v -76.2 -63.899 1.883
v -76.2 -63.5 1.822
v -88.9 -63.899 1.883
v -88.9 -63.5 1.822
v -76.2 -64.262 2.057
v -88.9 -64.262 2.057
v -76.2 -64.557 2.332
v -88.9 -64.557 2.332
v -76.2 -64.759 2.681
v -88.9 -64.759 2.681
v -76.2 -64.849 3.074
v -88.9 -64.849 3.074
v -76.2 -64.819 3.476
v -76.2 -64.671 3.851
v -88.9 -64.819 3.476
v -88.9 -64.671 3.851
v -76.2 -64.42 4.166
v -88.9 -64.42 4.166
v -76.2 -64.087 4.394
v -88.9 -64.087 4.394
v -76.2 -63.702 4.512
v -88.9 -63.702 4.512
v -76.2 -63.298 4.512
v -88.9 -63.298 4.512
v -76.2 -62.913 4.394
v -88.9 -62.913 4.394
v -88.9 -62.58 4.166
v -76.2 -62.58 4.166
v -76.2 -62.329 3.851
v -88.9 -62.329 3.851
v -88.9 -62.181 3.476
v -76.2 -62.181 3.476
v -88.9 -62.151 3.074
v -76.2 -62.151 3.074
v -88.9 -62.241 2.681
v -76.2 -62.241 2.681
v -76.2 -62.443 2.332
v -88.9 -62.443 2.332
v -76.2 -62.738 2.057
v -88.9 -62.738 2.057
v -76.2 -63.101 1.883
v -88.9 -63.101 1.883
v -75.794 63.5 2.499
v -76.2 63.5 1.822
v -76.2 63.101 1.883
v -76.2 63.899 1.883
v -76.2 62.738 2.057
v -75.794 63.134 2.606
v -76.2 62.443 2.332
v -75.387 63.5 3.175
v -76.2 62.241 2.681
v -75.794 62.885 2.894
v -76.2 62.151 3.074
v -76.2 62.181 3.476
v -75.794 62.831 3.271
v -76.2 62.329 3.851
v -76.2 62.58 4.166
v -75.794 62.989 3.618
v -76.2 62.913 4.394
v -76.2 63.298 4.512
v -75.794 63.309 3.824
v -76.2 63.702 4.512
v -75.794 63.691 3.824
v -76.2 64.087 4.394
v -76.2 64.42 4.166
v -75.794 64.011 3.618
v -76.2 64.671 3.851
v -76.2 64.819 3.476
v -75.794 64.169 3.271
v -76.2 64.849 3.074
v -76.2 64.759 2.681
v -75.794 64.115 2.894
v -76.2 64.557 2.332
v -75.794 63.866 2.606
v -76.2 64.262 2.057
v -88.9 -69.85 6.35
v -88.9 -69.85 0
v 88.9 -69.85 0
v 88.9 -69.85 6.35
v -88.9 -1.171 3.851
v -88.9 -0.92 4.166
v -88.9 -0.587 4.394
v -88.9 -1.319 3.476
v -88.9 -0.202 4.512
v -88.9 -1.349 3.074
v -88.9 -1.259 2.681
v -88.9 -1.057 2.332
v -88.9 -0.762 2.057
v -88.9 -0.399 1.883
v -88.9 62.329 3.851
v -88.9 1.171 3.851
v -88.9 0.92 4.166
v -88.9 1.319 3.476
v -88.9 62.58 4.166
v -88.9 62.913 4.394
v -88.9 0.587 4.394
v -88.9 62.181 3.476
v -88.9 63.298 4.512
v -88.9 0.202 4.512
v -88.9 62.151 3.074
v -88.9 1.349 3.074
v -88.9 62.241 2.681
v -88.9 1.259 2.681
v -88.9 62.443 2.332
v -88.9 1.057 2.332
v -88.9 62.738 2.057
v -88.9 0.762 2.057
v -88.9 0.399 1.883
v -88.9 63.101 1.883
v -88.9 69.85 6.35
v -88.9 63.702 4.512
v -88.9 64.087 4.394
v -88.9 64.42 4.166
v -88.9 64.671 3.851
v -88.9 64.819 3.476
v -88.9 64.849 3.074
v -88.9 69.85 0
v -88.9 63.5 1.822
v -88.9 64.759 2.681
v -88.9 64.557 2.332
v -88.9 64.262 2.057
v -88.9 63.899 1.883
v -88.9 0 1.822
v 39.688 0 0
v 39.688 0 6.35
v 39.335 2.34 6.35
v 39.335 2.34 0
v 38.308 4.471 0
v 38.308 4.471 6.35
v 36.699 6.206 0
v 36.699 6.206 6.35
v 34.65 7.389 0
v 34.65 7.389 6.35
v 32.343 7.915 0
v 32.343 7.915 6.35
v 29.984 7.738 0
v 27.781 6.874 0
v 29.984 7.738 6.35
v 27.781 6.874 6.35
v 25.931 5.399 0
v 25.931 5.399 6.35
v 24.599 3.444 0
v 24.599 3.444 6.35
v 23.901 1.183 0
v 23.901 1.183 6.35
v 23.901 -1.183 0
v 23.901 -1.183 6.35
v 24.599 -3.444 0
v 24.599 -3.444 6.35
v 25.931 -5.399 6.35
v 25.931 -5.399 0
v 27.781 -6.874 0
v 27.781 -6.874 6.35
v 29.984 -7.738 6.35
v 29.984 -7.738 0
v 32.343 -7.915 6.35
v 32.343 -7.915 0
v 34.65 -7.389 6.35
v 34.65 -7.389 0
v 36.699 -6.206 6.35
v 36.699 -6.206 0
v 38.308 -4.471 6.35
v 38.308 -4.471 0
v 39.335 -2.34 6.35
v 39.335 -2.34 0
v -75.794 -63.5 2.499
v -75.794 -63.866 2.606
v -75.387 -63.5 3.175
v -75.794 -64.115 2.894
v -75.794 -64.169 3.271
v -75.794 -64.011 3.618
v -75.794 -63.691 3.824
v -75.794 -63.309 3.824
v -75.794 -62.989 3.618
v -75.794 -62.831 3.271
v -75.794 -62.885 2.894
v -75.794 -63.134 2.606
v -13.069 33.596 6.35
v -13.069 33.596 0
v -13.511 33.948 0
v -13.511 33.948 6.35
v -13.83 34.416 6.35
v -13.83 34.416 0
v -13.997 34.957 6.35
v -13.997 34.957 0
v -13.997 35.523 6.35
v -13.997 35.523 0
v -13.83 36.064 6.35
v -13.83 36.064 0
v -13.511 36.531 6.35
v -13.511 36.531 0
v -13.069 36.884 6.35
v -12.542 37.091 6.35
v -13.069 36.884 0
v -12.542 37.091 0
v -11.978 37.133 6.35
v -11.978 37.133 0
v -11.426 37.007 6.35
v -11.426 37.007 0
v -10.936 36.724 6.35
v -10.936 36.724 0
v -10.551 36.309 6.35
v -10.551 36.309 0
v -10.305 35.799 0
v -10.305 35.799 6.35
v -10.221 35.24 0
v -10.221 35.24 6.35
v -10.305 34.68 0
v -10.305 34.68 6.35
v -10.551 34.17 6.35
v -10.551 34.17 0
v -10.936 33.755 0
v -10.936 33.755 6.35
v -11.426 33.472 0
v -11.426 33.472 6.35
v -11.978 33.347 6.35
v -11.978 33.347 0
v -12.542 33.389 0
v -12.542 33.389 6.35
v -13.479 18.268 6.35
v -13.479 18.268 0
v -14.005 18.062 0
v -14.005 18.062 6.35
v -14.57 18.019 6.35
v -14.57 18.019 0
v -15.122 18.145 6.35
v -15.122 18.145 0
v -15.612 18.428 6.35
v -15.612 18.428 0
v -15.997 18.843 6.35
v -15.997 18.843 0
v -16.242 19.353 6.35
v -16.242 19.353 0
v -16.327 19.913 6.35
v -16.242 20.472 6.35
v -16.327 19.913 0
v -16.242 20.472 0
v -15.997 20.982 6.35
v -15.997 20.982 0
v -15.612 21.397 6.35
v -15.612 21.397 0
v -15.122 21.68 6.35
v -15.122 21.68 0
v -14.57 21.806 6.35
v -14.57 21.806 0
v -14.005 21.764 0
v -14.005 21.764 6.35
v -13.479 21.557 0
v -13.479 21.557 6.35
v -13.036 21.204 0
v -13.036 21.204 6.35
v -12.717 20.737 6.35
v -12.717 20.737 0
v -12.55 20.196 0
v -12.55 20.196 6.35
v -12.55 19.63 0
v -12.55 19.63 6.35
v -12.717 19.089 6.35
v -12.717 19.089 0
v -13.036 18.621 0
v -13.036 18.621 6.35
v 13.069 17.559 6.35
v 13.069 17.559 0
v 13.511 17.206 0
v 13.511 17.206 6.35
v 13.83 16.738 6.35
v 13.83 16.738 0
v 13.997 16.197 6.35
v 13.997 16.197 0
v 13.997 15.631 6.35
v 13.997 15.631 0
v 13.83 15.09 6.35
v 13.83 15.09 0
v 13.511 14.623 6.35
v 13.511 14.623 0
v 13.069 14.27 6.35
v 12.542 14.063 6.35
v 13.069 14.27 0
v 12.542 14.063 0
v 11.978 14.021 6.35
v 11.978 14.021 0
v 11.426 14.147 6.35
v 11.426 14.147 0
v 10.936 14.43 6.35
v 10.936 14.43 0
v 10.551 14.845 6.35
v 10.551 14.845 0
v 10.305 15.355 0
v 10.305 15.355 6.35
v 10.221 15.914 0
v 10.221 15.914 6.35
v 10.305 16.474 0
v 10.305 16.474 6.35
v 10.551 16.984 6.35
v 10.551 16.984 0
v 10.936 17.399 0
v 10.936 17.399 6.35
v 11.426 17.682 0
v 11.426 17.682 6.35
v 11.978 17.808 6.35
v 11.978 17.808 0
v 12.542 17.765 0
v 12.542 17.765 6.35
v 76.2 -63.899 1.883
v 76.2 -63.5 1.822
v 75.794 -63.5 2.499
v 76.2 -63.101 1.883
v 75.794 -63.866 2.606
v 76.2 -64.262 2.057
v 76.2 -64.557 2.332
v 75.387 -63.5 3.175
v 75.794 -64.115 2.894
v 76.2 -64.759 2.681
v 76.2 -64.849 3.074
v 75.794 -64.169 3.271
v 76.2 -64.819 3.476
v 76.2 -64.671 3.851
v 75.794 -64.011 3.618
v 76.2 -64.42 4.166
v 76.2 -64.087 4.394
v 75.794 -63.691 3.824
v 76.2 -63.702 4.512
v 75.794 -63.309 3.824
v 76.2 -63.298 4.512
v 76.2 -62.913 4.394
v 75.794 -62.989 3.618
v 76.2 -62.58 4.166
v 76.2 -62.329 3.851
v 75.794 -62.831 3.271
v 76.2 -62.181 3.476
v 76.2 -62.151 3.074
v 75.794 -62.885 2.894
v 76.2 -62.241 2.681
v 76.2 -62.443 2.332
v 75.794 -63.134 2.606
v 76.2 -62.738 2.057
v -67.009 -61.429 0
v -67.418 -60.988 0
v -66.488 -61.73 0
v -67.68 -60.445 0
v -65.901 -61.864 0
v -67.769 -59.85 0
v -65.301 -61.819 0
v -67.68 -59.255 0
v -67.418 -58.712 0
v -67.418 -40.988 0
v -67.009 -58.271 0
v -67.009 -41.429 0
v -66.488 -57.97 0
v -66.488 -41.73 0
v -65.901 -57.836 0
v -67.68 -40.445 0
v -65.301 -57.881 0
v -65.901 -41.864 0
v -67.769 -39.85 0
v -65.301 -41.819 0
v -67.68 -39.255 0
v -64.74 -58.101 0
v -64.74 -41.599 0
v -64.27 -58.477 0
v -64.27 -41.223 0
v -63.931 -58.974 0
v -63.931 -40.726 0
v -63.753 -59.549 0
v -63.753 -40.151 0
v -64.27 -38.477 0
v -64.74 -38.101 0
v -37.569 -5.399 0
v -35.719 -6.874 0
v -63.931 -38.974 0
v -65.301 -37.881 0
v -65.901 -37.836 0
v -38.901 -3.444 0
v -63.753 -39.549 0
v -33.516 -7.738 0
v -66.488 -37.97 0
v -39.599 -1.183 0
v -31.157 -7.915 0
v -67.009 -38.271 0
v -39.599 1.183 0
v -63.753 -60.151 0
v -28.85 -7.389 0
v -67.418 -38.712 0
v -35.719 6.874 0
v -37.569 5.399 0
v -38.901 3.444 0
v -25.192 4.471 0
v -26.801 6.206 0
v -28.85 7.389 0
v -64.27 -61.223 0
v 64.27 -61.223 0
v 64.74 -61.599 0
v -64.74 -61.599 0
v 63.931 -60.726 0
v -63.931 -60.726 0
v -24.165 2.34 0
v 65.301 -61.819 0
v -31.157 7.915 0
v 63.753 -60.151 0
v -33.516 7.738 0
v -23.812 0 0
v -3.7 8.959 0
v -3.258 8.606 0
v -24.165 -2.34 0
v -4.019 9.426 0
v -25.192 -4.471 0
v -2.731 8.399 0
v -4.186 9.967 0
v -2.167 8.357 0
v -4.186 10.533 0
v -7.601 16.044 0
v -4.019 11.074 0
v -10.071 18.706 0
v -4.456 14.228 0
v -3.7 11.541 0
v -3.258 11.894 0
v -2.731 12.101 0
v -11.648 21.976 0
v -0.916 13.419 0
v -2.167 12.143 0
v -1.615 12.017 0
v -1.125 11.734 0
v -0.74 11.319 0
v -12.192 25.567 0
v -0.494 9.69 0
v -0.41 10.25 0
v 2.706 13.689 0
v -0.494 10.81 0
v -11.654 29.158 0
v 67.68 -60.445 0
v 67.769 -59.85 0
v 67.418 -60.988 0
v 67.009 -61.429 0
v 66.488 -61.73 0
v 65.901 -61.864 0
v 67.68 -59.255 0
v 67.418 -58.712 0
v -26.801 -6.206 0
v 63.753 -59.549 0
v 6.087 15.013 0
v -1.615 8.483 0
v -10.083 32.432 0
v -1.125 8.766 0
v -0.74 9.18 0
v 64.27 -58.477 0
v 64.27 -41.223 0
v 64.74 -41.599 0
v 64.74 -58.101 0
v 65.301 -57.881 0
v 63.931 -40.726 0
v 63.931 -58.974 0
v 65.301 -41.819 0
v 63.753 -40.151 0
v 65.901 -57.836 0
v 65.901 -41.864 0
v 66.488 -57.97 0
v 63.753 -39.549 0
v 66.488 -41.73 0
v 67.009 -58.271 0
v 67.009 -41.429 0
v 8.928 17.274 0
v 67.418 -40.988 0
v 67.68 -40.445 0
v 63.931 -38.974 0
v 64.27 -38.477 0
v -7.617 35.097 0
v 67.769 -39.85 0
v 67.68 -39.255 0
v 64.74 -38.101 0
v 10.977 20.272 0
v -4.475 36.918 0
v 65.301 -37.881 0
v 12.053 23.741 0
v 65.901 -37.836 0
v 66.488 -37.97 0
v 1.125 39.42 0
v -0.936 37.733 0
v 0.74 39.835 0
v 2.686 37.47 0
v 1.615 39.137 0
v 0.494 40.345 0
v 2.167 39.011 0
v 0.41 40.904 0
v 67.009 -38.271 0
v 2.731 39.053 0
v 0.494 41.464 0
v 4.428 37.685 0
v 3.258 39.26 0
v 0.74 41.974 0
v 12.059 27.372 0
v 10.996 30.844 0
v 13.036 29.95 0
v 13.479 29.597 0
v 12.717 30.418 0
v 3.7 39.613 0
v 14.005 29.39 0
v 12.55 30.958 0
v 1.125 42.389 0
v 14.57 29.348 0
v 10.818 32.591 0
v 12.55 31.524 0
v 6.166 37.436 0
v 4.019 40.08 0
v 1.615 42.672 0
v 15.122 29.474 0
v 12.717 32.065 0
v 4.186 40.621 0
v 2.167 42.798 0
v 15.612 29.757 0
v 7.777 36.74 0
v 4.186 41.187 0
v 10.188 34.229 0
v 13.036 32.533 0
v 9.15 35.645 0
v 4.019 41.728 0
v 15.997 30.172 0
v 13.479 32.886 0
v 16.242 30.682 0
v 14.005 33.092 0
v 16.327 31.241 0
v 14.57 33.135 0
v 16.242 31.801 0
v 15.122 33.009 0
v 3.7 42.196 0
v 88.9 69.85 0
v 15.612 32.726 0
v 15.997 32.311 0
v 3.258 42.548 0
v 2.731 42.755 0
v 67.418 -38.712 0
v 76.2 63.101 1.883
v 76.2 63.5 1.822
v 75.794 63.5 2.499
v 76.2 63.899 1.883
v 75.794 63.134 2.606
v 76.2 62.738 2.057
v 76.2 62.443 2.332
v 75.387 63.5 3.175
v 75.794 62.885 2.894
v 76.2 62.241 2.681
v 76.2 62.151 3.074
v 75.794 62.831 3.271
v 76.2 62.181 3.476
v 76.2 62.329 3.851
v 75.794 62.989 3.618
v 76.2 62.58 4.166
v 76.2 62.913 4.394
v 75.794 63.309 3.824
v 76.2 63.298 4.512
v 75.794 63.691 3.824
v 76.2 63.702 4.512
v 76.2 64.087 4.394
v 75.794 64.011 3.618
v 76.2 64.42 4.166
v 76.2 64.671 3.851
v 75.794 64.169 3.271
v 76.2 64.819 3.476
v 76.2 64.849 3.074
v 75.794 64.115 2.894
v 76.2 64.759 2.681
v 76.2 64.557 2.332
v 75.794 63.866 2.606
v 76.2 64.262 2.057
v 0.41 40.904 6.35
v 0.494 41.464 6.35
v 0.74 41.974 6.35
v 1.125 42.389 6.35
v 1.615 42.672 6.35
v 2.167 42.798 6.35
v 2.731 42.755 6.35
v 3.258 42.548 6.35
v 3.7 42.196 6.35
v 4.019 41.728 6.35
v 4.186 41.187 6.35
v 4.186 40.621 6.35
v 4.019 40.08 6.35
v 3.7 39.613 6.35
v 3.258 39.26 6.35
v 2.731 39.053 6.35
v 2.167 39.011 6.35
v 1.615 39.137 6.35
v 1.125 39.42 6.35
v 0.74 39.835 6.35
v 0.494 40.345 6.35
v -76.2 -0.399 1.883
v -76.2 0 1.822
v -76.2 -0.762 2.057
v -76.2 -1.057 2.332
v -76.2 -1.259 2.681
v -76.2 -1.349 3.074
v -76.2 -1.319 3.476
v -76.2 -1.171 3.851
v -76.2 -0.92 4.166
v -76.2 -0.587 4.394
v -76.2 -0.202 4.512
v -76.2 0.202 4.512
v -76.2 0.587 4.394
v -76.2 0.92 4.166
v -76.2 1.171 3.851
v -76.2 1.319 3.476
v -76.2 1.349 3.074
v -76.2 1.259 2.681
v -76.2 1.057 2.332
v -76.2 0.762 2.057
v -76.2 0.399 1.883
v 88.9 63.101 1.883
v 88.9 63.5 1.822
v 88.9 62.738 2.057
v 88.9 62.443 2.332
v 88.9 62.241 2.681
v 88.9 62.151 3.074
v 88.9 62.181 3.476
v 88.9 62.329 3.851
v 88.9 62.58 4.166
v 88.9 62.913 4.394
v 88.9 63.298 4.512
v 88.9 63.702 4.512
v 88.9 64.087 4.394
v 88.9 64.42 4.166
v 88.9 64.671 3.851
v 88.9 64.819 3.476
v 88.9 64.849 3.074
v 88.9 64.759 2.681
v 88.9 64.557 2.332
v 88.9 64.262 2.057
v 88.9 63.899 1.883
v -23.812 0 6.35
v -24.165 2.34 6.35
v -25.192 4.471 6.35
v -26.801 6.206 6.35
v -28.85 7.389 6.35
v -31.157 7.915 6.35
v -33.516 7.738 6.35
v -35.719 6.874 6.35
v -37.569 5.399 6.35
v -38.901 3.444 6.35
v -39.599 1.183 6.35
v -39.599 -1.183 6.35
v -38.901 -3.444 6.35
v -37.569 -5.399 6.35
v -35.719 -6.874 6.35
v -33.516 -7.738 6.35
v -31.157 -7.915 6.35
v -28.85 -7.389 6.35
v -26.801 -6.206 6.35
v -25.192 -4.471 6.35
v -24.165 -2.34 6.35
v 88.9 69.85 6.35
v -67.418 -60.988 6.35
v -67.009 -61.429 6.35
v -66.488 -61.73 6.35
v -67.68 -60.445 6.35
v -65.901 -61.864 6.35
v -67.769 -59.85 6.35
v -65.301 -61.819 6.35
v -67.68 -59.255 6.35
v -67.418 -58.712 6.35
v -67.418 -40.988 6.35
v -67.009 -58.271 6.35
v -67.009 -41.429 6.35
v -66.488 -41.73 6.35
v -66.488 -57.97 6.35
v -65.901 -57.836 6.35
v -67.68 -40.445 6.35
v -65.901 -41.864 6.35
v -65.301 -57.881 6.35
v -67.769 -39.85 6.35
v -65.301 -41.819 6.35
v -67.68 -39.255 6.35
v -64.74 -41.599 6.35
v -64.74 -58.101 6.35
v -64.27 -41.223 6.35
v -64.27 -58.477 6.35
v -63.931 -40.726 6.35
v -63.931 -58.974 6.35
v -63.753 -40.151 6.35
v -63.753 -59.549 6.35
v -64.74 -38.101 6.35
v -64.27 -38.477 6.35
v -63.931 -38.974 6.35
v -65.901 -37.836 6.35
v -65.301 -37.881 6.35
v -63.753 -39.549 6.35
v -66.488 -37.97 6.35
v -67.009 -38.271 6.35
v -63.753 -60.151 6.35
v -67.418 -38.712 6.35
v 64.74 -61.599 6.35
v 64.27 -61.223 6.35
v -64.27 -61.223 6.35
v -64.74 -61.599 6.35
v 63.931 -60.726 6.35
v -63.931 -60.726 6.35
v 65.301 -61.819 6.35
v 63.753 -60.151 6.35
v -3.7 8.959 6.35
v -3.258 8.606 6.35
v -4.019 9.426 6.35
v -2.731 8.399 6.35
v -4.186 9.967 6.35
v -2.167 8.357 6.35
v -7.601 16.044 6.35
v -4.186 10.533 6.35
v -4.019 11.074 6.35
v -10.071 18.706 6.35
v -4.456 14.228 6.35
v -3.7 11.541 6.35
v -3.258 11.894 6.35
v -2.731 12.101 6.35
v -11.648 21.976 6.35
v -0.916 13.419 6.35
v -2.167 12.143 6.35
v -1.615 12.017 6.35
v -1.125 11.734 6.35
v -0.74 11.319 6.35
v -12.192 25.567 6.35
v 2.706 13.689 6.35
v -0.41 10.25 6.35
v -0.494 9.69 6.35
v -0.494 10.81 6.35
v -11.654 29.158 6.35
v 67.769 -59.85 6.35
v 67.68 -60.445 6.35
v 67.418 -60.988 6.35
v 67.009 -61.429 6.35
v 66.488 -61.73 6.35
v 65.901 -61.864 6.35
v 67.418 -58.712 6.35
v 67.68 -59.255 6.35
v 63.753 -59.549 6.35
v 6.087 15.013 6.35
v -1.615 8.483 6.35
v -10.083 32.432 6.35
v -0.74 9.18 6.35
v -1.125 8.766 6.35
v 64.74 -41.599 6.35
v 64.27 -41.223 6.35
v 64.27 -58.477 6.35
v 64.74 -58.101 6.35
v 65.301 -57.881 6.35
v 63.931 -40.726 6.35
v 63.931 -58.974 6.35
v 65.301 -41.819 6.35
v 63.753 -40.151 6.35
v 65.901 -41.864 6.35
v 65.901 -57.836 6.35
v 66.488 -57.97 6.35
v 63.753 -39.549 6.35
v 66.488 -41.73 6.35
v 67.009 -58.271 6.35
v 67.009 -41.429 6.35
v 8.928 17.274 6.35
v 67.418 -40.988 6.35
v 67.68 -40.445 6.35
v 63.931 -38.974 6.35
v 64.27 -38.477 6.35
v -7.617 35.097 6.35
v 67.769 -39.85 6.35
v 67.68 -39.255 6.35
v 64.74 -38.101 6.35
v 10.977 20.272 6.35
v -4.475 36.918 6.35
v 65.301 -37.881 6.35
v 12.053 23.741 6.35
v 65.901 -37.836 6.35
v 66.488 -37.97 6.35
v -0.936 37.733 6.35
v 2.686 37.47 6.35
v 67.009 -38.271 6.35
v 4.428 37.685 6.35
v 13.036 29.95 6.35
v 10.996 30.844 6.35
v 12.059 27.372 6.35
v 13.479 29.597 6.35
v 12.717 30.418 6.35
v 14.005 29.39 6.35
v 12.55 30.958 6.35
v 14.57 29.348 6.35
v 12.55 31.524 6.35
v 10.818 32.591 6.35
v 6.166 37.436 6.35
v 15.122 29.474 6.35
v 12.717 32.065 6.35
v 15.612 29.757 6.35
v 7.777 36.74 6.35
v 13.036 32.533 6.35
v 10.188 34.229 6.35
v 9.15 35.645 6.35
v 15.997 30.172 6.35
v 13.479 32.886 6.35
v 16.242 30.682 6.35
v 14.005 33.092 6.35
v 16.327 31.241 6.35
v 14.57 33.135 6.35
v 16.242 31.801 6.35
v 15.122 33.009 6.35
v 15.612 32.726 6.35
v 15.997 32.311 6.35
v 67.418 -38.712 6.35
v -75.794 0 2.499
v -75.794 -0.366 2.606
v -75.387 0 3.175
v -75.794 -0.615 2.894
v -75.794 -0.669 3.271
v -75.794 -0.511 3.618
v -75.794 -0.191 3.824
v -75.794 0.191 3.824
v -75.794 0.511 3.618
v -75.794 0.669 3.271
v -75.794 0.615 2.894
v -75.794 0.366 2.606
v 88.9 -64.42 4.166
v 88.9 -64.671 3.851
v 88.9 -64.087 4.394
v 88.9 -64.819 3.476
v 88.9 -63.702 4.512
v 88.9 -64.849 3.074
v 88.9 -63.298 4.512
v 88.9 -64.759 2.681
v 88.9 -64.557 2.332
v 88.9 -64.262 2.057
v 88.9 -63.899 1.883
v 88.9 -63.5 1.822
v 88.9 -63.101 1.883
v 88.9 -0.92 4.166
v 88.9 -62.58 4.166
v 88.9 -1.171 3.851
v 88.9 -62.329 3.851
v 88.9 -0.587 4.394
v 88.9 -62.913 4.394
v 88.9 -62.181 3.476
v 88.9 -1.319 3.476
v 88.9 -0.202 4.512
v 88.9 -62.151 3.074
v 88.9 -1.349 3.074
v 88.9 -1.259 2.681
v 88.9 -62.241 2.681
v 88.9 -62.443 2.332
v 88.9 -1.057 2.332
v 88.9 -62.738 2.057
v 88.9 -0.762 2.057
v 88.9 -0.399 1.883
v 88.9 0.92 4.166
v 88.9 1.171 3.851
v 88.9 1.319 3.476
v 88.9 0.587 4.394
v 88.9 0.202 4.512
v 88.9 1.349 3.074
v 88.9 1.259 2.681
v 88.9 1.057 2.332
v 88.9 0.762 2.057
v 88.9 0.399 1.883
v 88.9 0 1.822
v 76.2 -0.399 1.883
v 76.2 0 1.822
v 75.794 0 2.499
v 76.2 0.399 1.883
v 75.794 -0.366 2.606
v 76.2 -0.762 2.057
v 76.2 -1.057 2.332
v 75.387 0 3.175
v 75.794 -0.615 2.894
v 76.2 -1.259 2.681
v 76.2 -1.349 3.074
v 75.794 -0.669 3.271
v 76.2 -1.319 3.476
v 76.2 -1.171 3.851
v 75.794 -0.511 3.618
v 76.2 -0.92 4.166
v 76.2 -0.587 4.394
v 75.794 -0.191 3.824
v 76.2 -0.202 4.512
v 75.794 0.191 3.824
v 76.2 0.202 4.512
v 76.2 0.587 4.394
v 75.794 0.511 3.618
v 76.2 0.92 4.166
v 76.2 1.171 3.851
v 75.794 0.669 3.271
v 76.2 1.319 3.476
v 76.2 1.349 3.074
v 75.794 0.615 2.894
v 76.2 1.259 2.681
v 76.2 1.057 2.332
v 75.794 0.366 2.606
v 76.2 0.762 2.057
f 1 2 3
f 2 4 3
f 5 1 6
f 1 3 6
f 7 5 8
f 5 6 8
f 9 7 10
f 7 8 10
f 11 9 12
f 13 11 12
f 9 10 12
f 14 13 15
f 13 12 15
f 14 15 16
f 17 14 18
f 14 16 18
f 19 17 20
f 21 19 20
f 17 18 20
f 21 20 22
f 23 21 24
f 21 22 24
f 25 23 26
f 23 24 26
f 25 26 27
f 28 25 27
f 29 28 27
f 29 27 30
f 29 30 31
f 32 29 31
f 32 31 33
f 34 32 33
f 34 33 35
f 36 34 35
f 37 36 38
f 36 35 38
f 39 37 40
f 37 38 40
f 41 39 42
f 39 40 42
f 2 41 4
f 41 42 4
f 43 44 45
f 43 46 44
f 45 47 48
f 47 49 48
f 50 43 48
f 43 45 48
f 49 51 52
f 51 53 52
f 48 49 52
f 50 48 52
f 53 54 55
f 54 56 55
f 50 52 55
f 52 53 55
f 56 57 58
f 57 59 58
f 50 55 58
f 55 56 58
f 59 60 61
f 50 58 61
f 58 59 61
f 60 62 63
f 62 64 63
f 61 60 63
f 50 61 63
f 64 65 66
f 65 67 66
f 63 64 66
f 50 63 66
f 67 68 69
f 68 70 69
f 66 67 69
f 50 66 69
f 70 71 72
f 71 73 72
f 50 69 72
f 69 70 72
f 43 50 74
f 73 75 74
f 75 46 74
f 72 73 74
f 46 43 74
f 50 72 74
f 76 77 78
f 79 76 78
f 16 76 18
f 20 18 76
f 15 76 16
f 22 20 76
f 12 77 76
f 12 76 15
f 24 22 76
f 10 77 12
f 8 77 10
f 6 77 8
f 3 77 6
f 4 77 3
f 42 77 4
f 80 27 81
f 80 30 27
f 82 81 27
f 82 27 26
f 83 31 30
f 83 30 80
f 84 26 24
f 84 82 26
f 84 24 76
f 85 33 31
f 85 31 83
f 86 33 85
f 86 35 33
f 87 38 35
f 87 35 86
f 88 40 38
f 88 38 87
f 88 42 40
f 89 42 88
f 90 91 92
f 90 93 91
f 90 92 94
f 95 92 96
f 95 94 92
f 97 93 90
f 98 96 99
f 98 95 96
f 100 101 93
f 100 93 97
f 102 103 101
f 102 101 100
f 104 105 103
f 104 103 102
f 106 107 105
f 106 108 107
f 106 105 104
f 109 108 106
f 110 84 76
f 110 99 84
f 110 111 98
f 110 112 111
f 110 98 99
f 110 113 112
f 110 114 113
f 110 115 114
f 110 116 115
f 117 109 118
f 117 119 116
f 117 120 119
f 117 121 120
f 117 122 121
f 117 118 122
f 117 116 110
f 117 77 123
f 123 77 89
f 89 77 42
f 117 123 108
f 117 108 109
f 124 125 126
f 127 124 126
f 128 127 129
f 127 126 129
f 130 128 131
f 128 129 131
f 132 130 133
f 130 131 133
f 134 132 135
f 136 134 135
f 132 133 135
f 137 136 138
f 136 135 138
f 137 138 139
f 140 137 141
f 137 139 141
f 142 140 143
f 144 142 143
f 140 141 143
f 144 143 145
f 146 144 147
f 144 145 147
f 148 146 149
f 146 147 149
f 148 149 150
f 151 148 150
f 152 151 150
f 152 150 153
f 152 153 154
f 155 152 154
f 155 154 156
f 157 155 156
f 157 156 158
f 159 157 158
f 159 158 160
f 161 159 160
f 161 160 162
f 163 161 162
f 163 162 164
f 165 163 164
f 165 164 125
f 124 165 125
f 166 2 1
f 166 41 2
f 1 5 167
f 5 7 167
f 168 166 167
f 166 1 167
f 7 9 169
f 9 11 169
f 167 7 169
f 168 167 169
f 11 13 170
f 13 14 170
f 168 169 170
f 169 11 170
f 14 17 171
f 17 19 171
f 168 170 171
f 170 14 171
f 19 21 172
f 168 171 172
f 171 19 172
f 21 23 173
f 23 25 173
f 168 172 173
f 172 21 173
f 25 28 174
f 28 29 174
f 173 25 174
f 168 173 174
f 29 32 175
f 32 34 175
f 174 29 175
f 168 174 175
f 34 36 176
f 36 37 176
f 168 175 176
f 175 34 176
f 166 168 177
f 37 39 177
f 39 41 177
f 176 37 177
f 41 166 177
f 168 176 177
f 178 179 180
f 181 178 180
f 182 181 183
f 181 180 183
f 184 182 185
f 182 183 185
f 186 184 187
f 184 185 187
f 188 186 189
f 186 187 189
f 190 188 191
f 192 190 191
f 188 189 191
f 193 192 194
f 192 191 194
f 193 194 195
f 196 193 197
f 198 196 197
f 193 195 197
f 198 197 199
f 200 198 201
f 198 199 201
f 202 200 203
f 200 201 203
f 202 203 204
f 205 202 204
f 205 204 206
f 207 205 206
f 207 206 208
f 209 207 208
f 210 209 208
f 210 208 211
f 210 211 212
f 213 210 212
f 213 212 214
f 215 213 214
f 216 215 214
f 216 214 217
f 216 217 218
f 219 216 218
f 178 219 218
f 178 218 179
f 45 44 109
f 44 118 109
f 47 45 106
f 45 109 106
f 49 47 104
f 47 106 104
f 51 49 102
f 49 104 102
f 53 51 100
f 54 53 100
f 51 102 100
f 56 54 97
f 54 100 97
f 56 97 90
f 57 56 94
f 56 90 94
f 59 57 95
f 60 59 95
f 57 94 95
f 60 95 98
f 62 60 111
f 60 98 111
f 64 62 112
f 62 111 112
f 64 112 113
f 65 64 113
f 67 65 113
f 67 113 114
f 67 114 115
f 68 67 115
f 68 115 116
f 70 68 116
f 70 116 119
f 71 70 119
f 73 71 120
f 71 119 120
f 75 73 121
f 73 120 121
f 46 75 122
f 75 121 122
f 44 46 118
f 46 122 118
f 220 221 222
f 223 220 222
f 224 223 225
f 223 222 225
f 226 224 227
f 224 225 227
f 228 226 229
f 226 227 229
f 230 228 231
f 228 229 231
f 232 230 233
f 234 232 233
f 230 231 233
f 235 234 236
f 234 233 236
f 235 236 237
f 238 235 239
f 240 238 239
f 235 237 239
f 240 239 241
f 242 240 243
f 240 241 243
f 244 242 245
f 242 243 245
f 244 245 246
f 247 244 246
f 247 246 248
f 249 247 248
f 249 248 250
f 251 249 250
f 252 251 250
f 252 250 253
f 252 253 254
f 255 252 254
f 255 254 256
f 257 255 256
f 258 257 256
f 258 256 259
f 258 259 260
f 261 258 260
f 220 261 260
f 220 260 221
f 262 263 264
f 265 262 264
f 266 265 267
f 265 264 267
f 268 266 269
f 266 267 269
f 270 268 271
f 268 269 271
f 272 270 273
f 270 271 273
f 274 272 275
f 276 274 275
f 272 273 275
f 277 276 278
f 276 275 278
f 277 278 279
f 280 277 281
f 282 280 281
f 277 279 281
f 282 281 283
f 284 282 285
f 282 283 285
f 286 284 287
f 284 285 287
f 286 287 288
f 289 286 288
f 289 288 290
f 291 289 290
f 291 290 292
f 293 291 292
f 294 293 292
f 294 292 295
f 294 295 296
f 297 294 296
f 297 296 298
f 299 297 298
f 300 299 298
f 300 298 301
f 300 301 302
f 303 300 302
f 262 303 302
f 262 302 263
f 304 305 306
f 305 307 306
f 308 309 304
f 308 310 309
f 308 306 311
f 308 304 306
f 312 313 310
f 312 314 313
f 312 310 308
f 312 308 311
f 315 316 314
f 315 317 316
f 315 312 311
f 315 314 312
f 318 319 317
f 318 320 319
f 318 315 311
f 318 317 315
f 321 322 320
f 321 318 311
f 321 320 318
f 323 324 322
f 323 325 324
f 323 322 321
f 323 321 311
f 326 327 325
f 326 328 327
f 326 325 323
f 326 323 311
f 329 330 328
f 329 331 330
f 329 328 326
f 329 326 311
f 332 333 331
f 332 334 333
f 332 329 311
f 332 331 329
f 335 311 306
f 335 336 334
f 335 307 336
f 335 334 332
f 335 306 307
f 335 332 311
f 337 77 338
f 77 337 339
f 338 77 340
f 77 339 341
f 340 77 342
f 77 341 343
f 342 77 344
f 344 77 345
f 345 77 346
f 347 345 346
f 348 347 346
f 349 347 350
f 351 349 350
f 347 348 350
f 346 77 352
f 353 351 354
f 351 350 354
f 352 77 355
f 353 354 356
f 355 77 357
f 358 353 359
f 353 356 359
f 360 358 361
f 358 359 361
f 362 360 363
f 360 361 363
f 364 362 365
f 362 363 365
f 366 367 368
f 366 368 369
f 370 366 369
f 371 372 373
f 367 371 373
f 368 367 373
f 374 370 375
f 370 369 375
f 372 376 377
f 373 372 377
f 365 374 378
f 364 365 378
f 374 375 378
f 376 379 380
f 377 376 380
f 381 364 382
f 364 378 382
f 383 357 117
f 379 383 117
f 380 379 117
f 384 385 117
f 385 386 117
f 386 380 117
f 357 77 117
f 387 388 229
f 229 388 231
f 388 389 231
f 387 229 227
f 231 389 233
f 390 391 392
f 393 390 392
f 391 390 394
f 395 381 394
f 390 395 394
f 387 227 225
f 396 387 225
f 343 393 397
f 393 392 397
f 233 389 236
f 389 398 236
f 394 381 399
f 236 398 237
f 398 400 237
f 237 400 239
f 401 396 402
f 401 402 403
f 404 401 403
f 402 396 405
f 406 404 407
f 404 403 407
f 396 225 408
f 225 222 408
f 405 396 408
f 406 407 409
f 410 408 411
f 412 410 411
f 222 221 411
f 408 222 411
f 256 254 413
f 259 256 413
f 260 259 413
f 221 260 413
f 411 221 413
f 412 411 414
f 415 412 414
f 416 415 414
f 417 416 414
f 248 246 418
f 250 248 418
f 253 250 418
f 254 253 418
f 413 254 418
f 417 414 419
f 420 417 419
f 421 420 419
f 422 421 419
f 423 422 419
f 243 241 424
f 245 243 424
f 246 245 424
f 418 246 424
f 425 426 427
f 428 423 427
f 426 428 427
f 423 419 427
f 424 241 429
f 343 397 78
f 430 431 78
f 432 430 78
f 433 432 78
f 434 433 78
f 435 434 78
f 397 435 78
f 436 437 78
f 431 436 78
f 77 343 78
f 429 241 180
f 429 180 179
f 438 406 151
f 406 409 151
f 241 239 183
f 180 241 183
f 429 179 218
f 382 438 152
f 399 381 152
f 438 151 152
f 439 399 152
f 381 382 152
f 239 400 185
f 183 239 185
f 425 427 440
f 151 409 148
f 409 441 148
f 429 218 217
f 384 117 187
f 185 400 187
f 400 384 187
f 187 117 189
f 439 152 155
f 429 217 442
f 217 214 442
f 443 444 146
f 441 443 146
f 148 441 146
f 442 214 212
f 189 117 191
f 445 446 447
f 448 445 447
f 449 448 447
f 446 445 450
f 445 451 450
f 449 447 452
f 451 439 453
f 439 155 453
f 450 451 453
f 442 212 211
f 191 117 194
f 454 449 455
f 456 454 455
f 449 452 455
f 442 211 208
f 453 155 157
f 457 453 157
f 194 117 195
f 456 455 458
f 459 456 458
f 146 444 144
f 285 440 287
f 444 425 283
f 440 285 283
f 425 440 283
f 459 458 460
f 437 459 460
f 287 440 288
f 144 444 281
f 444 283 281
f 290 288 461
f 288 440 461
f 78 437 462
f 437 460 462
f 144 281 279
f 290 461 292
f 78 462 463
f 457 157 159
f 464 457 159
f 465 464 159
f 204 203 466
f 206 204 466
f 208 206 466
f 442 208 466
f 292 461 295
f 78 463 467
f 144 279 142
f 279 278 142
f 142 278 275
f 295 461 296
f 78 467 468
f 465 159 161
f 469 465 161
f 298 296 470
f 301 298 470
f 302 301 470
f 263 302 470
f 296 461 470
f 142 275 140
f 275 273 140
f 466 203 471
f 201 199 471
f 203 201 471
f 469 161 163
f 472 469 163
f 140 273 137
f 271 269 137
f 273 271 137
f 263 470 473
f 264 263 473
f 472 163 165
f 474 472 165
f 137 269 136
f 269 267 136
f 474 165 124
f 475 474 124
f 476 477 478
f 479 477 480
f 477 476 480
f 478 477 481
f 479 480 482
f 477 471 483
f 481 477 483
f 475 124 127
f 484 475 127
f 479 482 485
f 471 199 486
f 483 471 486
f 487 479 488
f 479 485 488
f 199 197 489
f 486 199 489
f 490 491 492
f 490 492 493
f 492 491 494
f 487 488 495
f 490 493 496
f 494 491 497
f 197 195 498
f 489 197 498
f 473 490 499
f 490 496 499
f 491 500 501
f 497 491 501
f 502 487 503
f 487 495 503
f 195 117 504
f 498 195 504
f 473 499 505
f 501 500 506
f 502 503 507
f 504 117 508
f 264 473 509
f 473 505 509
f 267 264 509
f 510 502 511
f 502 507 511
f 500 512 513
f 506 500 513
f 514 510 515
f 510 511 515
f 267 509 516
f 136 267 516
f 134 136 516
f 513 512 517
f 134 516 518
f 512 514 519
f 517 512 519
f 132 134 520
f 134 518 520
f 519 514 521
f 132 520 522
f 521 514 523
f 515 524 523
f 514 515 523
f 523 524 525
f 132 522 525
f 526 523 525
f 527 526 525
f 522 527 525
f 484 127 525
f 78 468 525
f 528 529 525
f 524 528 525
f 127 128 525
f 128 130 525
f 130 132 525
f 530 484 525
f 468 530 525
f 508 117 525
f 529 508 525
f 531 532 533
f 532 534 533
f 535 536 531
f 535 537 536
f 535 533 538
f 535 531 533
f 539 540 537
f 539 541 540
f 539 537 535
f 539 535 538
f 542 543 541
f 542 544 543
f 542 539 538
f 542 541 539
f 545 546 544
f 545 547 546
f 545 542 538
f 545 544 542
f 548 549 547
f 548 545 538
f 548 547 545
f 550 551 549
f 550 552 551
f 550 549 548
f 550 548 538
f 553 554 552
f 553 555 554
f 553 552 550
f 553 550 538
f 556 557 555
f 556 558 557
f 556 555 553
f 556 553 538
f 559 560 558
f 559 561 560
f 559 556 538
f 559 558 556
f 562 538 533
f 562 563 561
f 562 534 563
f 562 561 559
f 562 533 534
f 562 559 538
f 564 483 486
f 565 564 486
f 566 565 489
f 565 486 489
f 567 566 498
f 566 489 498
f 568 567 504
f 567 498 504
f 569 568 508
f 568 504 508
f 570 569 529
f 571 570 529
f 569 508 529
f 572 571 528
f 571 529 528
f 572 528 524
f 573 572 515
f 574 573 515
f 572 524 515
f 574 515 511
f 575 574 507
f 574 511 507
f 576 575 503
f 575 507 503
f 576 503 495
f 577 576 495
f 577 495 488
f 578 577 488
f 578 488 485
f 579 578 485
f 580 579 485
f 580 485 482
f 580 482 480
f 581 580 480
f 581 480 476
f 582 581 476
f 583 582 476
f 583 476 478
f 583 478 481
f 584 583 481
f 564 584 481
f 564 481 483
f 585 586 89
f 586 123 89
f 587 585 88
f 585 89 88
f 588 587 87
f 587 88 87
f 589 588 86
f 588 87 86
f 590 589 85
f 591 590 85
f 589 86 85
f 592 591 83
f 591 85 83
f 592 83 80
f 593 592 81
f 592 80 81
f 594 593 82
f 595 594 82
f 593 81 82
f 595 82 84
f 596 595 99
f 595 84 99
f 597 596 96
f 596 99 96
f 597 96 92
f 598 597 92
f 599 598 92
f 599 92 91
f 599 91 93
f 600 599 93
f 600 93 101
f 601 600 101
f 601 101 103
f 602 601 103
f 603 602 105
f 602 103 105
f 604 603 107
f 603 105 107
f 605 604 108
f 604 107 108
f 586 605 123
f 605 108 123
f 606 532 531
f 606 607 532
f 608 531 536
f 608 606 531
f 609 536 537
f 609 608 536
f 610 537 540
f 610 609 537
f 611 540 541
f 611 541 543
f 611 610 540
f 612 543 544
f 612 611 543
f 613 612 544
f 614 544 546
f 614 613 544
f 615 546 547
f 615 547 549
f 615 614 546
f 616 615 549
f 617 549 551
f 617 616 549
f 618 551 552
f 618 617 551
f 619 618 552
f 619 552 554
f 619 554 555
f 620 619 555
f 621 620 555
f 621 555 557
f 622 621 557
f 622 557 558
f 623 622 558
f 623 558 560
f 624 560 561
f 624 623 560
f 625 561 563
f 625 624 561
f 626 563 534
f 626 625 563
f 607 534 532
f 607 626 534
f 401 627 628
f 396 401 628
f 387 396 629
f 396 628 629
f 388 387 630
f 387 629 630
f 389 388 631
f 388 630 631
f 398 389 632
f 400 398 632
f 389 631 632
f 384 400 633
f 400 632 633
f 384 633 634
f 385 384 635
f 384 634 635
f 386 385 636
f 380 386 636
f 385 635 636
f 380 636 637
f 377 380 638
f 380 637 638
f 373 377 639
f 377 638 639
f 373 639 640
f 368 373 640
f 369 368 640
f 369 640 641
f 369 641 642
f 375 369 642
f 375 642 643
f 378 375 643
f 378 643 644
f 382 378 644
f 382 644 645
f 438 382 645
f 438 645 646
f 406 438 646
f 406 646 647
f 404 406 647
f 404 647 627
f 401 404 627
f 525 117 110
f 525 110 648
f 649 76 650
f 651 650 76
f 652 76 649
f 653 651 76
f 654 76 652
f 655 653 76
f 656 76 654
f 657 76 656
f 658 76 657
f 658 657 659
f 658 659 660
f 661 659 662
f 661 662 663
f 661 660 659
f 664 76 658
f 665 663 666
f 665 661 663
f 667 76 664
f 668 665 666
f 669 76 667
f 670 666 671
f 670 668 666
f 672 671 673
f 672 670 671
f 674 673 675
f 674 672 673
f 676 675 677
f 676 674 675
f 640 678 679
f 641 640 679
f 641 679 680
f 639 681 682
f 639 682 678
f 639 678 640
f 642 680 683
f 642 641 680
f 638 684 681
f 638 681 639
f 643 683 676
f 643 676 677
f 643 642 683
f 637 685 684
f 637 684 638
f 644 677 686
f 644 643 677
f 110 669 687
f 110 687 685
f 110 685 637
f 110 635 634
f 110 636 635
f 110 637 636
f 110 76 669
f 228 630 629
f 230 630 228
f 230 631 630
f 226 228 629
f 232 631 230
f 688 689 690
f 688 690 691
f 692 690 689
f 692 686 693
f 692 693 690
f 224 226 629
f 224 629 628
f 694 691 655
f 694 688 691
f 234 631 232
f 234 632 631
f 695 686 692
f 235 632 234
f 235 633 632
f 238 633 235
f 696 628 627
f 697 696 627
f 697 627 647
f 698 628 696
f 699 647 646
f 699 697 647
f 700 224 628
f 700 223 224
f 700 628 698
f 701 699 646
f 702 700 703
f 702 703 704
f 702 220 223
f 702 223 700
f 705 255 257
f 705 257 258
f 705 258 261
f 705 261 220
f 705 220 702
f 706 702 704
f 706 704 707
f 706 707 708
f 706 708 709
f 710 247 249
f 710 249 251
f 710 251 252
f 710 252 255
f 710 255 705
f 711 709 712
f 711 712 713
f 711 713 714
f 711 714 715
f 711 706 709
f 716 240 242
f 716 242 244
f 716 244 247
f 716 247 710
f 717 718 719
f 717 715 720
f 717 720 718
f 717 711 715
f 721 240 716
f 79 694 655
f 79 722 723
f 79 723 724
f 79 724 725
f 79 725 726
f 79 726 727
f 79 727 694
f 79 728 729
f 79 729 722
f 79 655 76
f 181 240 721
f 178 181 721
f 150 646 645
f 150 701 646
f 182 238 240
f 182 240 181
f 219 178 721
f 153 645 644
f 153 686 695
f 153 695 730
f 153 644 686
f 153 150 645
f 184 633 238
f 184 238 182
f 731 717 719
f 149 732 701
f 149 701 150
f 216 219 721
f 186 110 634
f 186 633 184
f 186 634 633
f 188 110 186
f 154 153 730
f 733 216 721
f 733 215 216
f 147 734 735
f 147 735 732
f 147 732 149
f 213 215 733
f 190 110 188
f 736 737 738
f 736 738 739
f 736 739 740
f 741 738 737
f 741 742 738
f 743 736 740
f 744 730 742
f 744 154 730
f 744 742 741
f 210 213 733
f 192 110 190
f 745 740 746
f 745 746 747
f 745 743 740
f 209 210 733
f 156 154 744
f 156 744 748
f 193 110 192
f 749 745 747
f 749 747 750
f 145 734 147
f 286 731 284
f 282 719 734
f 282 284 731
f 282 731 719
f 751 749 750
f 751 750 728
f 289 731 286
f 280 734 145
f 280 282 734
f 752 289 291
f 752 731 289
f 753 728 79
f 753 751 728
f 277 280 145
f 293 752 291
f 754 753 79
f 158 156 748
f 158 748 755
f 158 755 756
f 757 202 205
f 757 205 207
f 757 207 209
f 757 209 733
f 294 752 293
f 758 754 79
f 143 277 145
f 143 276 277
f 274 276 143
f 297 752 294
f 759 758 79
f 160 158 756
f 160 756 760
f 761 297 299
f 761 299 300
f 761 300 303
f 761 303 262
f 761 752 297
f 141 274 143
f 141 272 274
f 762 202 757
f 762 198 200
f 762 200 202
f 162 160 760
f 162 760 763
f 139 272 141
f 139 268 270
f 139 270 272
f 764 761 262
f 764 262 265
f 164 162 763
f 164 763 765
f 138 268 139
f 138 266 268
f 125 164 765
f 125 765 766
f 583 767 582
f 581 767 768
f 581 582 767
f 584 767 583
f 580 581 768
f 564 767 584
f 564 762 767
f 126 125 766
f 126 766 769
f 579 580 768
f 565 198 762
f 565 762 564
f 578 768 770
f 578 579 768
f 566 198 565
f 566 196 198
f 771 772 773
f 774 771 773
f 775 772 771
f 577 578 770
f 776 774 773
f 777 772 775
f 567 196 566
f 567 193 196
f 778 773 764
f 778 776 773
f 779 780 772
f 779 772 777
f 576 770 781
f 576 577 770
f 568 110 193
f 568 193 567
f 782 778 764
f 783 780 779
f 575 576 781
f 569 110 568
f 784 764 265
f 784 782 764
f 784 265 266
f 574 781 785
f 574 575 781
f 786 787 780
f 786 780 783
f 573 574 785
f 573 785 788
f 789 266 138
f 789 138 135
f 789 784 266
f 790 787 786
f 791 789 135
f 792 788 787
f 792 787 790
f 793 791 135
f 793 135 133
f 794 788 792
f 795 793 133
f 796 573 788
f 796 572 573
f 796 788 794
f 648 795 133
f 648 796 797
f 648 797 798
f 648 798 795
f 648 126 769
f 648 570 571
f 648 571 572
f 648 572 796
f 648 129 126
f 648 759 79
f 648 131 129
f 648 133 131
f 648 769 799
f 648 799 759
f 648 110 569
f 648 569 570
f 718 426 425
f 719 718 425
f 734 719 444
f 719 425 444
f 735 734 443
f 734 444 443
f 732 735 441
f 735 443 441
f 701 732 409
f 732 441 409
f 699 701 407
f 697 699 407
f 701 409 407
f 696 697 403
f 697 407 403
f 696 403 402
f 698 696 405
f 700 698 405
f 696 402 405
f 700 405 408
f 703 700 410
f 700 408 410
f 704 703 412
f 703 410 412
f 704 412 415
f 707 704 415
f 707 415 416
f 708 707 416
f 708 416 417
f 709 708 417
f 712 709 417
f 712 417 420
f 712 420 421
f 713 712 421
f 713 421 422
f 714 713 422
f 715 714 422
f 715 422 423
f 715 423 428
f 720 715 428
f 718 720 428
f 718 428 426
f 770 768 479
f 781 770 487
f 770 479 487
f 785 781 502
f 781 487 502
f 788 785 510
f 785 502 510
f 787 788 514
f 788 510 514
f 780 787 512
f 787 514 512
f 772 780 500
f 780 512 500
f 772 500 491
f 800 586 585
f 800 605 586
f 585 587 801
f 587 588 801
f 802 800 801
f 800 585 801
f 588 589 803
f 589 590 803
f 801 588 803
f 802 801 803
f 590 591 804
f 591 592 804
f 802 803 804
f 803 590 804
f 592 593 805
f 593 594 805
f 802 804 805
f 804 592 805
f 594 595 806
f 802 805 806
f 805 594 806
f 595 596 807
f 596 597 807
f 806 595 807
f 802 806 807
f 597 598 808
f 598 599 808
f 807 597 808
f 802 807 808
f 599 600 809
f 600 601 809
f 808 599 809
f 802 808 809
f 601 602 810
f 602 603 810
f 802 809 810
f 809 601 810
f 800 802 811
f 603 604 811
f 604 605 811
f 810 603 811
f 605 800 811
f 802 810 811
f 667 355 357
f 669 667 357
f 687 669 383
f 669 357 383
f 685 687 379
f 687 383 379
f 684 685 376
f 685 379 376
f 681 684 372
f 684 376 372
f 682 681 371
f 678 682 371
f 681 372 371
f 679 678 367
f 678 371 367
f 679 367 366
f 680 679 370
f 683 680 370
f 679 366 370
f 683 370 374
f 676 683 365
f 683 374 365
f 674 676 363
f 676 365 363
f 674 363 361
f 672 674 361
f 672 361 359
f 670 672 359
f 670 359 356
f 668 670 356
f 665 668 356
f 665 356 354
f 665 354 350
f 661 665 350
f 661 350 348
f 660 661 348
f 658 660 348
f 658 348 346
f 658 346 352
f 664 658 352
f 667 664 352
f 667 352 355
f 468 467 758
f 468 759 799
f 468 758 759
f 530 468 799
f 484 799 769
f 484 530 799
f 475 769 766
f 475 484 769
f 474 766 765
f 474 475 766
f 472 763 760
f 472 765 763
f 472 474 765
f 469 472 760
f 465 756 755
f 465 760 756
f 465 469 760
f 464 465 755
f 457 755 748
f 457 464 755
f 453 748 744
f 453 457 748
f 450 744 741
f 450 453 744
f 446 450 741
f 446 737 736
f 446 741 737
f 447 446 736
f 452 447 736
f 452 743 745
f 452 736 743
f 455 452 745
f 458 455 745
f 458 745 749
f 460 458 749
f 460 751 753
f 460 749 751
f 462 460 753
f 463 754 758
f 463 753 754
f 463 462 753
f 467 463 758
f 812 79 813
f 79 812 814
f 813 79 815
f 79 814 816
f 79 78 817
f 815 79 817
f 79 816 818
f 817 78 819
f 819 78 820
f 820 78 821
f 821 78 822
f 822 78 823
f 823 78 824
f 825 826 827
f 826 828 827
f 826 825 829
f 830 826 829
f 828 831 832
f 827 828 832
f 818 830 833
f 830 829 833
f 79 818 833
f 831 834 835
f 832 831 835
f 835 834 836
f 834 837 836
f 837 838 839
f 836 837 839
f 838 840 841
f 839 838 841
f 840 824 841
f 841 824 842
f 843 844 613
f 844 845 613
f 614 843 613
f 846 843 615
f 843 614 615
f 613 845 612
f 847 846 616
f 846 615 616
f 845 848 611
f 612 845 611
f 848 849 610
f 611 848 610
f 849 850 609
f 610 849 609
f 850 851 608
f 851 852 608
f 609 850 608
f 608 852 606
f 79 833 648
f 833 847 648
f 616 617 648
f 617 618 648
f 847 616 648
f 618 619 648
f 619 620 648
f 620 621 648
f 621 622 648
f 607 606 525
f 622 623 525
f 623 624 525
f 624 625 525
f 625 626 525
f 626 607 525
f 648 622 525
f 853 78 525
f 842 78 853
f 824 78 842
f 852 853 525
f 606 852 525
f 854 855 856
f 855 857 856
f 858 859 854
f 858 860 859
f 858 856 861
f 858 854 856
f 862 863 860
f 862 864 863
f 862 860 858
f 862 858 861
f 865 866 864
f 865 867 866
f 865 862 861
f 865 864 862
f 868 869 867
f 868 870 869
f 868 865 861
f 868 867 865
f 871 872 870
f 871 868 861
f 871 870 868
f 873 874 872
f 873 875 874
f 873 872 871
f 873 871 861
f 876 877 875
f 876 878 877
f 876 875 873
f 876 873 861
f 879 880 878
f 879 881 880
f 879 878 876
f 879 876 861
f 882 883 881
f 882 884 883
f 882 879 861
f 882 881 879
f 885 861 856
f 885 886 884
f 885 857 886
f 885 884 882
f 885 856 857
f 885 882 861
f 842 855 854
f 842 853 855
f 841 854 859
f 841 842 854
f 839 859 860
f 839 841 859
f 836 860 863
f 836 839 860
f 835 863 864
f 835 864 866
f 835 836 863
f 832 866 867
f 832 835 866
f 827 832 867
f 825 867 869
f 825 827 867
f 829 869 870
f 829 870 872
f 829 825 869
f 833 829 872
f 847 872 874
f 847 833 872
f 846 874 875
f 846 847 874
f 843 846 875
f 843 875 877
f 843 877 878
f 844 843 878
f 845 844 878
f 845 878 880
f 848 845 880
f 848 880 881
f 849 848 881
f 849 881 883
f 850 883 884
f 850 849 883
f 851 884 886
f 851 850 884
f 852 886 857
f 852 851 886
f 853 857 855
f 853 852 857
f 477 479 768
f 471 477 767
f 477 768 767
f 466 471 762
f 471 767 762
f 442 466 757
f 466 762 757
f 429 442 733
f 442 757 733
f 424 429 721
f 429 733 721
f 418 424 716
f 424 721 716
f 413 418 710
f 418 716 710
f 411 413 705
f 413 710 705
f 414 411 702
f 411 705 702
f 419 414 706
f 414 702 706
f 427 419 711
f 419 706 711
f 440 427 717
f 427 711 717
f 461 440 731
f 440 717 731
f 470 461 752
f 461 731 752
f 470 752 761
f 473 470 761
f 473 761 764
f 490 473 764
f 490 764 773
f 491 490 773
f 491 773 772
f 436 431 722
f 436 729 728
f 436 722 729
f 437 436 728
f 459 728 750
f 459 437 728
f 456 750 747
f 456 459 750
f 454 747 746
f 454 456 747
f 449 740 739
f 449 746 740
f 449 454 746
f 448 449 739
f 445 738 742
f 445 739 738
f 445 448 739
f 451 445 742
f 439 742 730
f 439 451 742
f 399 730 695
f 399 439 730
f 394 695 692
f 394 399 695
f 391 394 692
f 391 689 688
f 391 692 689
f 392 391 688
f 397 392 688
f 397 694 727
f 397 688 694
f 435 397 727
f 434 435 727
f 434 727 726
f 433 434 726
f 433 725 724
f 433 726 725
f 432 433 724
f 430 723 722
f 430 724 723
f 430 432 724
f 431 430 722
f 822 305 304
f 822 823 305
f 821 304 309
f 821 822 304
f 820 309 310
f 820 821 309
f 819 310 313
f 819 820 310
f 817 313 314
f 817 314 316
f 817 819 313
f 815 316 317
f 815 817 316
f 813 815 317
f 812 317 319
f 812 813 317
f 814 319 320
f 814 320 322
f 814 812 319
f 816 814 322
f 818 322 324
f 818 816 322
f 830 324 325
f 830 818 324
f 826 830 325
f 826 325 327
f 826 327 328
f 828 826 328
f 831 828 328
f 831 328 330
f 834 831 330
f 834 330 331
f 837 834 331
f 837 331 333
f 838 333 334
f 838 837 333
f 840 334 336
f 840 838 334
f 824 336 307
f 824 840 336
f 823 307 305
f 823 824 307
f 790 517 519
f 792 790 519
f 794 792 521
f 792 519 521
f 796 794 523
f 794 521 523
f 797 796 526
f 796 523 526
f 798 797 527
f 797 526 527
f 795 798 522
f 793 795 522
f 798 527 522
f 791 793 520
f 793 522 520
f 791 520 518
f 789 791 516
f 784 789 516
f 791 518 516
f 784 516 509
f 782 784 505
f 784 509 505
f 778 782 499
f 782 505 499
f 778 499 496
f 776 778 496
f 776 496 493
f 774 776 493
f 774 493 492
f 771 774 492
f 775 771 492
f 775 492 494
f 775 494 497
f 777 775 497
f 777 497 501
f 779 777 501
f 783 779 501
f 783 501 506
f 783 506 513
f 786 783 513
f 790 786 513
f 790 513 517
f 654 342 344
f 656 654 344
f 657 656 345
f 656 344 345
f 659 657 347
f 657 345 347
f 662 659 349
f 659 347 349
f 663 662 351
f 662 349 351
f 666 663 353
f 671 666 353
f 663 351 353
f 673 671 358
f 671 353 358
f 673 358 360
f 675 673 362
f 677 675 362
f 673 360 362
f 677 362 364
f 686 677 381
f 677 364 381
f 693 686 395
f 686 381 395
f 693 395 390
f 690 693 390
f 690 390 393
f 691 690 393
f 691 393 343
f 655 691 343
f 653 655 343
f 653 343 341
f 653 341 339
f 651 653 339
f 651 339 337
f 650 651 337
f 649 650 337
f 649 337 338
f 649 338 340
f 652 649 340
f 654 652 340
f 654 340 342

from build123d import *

# Parameters (mm, degrees)
SKETCH1_W                          = 177.8
SKETCH1_H                          = 139.7
BOSS_EXTRUDE1_DEPTH                = 6.35
SKETCH2_R                          = 7.9375
CUT_EXTRUDE1_DEPTH                 = 7.35
TAP_DRILL_FOR_6_32_TAP1_AT_2_COUNT = 2
TAP_DRILL_FOR_6_32_TAP1_AT_2_PITCH = 63.5
TAP_DRILL_FOR_6_32_TAP1_AT_3_COUNT = 2
TAP_DRILL_FOR_6_32_TAP1_AT_3_PITCH = 127
TAP_DRILL_FOR_10_32_TAP1_D         = 4.0386
SKETCH20_R                         = 12.192
CUT_EXTRUDE4_DEPTH                 = 7.35
F_6_CLEARANCE_HOLE1_D              = 3.7973
CIRPATTERN1_COUNT                  = 6
CUT_EXTRUDE5_DEPTH                 = 7.35


with BuildPart() as part:
    # Sketch1 → Boss-Extrude1 (new body)
    with BuildSketch(Plane.XY):
        Rectangle(SKETCH1_W, SKETCH1_H)
    extrude(amount=BOSS_EXTRUDE1_DEPTH)

    # Sketch2 → Cut-Extrude1 (cut, through all)
    with BuildSketch(Plane.XY.offset(6.35)):
        with Locations((-31.75, 0)):
            Circle(SKETCH2_R)
        with Locations((31.75, 0)):
            Circle(SKETCH2_R)
    extrude(amount=-CUT_EXTRUDE1_DEPTH, mode=Mode.SUBTRACT)

    # Sketch17 → Tap Drill for #6-32 Tap1 (revolve, cut)
    with BuildSketch(Plane(origin=(88.9, 63.5, 3.175), x_dir=(0, 0, -1), z_dir=(0, 1, 0))):
        Polygon((0, 0), (0, 13.51269403), (1.35255, 12.7), (1.35255, 0), align=None)
    tap_drill_for_6_32_tap1 = revolve(axis=Axis((95.25, 63.5, 3.175), (-1, 0, 0)), mode=Mode.SUBTRACT)

    # Tap Drill for #6-32 Tap1 at 2: Tap Drill for #6-32 Tap1 ×2
    with Locations(*[(0, -i * TAP_DRILL_FOR_6_32_TAP1_AT_2_PITCH, 0) for i in range(1, TAP_DRILL_FOR_6_32_TAP1_AT_2_COUNT)]):
        add(tap_drill_for_6_32_tap1, mode=Mode.SUBTRACT)

    # Tap Drill for #6-32 Tap1 at 3: Tap Drill for #6-32 Tap1 ×2
    with Locations(*[(0, -i * TAP_DRILL_FOR_6_32_TAP1_AT_3_PITCH, 0) for i in range(1, TAP_DRILL_FOR_6_32_TAP1_AT_3_COUNT)]):
        add(tap_drill_for_6_32_tap1, mode=Mode.SUBTRACT)

    # Mirror2: Tap Drill for #6-32 Tap1 across plane
    add(tap_drill_for_6_32_tap1.mirror(Plane(origin=(0, 0, 0), x_dir=(0, 0, 1), z_dir=(1, 0, 0))), mode=Mode.SUBTRACT)

    # Mirror2 copy 1 sketch → Mirror2 copy 1 (revolve, cut)
    with BuildSketch(Plane(origin=(-88.9, 0, 3.175), x_dir=(0, 0, -1), z_dir=(0, 1, 0))):
        Polygon((0, 0), (0, -13.51269403), (1.35255, -12.7), (1.35255, 0), align=None)
    revolve(axis=Axis((-95.25, 0, 3.175), (-1, 0, 0)), mode=Mode.SUBTRACT)

    # Mirror2 copy 2 sketch → Mirror2 copy 2 (revolve, cut)
    with BuildSketch(Plane(origin=(-88.9, -63.5, 3.175), x_dir=(0, 0, -1), z_dir=(0, 1, 0))):
        Polygon((0, 0), (0, -13.51269403), (1.35255, -12.7), (1.35255, 0), align=None)
    revolve(axis=Axis((-95.25, -63.5, 3.175), (-1, 0, 0)), mode=Mode.SUBTRACT)

    # Tap Drill for #10-32 Tap1 (through all)
    with Locations(Plane.XY.offset(6.35)):
        with Locations((-65.750000072, -59.85), (-65.750000072, -39.85)):
            tap_drill_for_10_32_tap1 = Hole(TAP_DRILL_FOR_10_32_TAP1_D / 2)

    # Mirror3: Tap Drill for #10-32 Tap1 across plane
    add(tap_drill_for_10_32_tap1.mirror(Plane(origin=(0, 0, 0), x_dir=(0, 0, 1), z_dir=(1, 0, 0))), mode=Mode.SUBTRACT)

    # Sketch20 → Cut-Extrude4 (cut, through all)
    with BuildSketch(Plane.XY.offset(6.35)):
        with Locations((0, 25.577056324)):
            Circle(SKETCH20_R)
    extrude(amount=-CUT_EXTRUDE4_DEPTH, mode=Mode.SUBTRACT)

    # #6 Clearance Hole1 (through all)
    with Locations(Plane.XY.offset(6.35)):
        with Locations((2.308510654, 40.904181905)):
            f_6_clearance_hole1 = Hole(F_6_CLEARANCE_HOLE1_D / 2)

    # CirPattern1: #6 Clearance Hole1 ×6 about axis
    cirpattern1_axis = Axis((0, 25.577056324, 0), (0, 0, 1))
    for i in range(1, CIRPATTERN1_COUNT):
        add(f_6_clearance_hole1.rotate(cirpattern1_axis, i * 360 / CIRPATTERN1_COUNT), mode=Mode.SUBTRACT)

    # Sketch23 → Cut-Extrude5 (cut, through all)
    with BuildSketch(Plane(origin=(0, 0, 0), x_dir=(-1, 0, 0), z_dir=(0, 0, -1))):
        with BuildLine():
            ThreePointArc((0.824054314, 35.186643177), (-8.500139633, 36.23824065), (-9.551737105, 26.914046703))
            ThreePointArc((-9.551737105, 26.914046703), (-0.227543158, 25.862449231), (0.824054314, 35.186643177))
        make_face()
    extrude(amount=-CUT_EXTRUDE5_DEPTH, mode=Mode.SUBTRACT)


solid = part.part
